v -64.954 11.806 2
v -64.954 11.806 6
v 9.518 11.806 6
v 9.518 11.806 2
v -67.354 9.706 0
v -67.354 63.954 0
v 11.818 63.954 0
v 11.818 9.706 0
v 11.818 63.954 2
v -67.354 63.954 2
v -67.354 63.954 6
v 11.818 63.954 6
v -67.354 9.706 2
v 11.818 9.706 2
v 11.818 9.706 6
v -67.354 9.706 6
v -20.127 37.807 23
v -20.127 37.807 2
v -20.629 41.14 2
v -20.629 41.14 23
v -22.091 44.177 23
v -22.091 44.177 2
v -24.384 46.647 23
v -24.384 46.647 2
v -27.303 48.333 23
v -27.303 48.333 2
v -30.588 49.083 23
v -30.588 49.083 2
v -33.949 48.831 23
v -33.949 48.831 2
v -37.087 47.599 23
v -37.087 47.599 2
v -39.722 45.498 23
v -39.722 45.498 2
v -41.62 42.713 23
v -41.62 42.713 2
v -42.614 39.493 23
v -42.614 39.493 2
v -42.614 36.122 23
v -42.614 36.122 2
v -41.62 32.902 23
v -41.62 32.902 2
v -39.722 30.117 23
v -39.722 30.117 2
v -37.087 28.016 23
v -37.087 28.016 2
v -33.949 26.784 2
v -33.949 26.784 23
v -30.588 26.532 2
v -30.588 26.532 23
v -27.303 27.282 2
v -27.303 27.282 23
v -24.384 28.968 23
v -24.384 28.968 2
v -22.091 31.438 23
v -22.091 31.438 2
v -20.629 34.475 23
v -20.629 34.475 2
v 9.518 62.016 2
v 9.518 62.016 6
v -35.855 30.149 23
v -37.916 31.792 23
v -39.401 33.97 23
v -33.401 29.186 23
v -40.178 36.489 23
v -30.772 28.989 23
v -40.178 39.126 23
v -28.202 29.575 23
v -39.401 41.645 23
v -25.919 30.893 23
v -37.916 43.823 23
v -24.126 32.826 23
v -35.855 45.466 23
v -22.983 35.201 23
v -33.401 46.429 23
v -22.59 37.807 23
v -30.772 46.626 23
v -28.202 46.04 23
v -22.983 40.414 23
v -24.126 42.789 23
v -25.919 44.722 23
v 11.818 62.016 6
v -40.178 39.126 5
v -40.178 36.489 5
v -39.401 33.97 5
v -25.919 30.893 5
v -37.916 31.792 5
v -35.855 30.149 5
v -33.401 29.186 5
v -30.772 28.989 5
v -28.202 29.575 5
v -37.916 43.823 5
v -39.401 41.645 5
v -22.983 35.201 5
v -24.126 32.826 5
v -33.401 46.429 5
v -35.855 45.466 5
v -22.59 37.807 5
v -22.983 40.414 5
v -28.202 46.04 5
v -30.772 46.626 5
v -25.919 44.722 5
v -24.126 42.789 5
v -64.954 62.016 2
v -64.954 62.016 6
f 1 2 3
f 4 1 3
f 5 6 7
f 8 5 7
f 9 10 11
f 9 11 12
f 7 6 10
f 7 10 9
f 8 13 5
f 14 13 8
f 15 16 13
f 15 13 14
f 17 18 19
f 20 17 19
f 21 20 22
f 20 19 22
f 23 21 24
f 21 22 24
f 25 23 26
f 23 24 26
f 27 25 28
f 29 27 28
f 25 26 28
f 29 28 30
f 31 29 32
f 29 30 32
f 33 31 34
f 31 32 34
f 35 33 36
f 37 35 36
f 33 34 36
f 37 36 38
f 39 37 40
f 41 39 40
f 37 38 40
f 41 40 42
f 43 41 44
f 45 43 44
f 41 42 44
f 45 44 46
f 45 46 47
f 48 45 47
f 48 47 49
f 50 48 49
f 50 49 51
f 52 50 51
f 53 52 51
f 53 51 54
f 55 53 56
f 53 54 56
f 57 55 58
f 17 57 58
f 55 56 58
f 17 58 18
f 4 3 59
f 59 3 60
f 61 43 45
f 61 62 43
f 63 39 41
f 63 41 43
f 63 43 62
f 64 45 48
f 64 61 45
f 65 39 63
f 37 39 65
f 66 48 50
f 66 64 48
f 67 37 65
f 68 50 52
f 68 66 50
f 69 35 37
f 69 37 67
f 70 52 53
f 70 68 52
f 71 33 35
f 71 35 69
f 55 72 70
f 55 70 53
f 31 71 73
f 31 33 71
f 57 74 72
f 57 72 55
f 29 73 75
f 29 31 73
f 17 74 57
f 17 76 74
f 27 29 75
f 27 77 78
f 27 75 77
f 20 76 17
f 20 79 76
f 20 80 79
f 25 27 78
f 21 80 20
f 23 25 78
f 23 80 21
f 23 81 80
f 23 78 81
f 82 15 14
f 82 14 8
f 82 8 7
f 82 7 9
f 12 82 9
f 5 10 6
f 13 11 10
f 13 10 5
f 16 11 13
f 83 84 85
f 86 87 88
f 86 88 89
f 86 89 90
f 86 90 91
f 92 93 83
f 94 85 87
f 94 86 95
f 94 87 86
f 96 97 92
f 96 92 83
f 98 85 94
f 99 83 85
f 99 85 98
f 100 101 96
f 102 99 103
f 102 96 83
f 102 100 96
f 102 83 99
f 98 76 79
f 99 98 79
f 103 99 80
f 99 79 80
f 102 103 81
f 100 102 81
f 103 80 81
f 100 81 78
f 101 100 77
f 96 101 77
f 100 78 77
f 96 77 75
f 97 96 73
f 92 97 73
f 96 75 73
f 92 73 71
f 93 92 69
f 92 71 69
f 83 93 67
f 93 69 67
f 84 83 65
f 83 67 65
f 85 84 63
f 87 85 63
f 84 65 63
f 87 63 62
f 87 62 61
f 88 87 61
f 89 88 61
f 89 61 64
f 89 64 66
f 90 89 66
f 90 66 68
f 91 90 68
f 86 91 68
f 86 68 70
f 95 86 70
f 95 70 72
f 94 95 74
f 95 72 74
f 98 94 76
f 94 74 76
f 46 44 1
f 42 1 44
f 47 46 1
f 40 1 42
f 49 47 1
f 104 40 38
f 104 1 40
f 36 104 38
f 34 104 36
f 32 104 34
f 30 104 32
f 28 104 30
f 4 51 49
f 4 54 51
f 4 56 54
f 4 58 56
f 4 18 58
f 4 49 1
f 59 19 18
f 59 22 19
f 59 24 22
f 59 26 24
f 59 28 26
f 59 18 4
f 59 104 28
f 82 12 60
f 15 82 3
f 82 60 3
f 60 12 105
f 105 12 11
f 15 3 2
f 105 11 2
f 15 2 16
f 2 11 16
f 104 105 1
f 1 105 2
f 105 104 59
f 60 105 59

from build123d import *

# Parameters (mm, degrees)
F0_W      = 79.172081314
F0_H      = 54.2475348338
F1_DEPTH  = 2
F2_W      = 79.172081314
F2_H      = 1.9382014871
F3_DEPTH  = 4
F4_W      = 52.3093333468
F4_H      = 4
F5_DEPTH  = 2.3
F6_W      = 76.872081314
F6_H      = 4
F7_DEPTH  = 2.1
F8_W      = 50.2093333468
F8_H      = 4
F9_DEPTH  = 2.4
F10_R     = 11.306687144
F11_DEPTH = 21
F12_R     = 9.8017826829
F13_DEPTH = 11
F14_R     = 8.8437005901
F15_DEPTH = 18


with BuildPart() as f1:
    # F0 (on Top) → F1 (new body)
    with BuildSketch(Plane.XY):
        with Locations((-27.7679827996, 36.830064375)):
            Rectangle(F0_W, F0_H)
    extrude(amount=F1_DEPTH)

    # F2 (on face) → F3 (join)
    with BuildSketch(Plane.XY.offset(2)):
        with Locations((-27.7679827996, 62.9847310483)):
            Rectangle(F2_W, F2_H)
    extrude(amount=F3_DEPTH)

    # F4 (on face) → F5 (join)
    with BuildSketch(Plane.YZ.offset(11.8180578575)):
        with Locations((35.8609636314, 4)):
            Rectangle(F4_W, F4_H)
    extrude(amount=-F5_DEPTH)

    # F6 (on face) → F7 (join)
    with BuildSketch(Plane.XZ.offset(-9.706296958)):
        with Locations((-28.9179827996, 4)):
            Rectangle(F6_W, F6_H)
    extrude(amount=-F7_DEPTH)

    # F8 (on face) → F9 (join)
    with BuildSketch(Plane(origin=(-67.3540234566, 0, 0), x_dir=(0, -1, 0), z_dir=(-1, 0, 0))):
        with Locations((-36.9109636314, 4)):
            Rectangle(F8_W, F8_H)
    extrude(amount=-F9_DEPTH)

    # F10 (on face) → F11 (join)
    with BuildSketch(Plane.XY.offset(2)):
        with Locations((-31.4333550632, 37.8074981272)):
            Circle(F10_R)
    extrude(amount=F11_DEPTH)

    # F12 (on face) → F13 (join)
    with BuildSketch(Plane.XY.offset(23)):
        with Locations((-31.4333550632, 37.8074981272)):
            Circle(F12_R)
    extrude(amount=-F13_DEPTH)

    # F14 (on face) → F15 (cut)
    with BuildSketch(Plane.XY.offset(23)):
        with Locations((-31.4333550632, 37.8074981272)):
            Circle(F14_R)
    extrude(amount=-F15_DEPTH, mode=Mode.SUBTRACT)


solid = f1.part
